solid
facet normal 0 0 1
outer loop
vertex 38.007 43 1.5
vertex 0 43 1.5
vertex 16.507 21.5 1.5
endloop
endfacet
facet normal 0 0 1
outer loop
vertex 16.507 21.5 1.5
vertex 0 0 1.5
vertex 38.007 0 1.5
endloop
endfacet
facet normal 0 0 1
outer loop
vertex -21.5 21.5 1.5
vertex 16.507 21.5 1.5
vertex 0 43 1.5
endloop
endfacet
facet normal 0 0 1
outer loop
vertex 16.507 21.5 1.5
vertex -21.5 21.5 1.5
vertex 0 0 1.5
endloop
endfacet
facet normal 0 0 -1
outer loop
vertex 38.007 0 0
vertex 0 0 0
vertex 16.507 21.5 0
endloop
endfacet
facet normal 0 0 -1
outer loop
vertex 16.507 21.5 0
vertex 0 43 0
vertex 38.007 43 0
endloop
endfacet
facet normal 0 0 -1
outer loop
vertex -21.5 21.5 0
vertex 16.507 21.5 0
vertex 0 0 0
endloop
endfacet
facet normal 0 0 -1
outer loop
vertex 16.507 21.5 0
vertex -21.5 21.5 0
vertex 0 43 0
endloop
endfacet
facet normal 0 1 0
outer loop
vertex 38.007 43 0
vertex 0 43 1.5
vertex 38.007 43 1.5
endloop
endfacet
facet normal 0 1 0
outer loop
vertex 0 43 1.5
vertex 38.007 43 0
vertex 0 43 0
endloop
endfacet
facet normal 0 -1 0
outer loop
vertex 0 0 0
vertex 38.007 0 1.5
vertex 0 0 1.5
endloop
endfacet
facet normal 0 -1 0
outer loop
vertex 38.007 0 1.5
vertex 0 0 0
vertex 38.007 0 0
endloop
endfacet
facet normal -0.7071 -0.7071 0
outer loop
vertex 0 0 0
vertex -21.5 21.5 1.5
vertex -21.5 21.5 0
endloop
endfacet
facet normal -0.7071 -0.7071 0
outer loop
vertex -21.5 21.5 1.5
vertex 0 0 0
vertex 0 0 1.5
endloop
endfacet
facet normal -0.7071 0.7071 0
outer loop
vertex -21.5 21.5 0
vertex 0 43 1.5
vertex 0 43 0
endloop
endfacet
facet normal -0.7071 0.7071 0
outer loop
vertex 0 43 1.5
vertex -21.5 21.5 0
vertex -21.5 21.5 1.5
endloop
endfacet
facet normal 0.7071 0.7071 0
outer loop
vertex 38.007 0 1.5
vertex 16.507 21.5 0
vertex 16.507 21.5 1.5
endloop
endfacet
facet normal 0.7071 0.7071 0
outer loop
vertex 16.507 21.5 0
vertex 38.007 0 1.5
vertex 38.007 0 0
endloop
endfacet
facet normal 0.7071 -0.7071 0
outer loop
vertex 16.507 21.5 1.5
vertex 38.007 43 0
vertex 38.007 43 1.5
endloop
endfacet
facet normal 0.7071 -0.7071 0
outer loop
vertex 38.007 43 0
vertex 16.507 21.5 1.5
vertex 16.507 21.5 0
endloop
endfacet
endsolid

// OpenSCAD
$tileH = 43;
$m = $tileH / 10;
$c = sqrt(pow($tileH, 2)/2);
$d = 1.5;
$fn = 3;
$links = 4;

difference() {
union() {
translate([0, 0, 0]) {
    cube([$tileH*$links/4, $tileH, $d]);
}

for (i = [0:$links]) {
     translate([i * $c/4, 0, 0]) {
        rotate([0, 0, 45]) {
            if (i==0) {
                cube([$c, $c, 1.5]);
            } else {
             //  cube([$c, $c, $d*(i+1)]);
            }
        }
        if (i < $links-1) {
            translate([-$tileH/4, $tileH/2-$m/2, $d*i]) {
       //  rotate([0, 50, 0]) {
        //    cube([$m, $m, $m *2]);
        //}
      }
  }
     }
}

}



translate([($links+1) * $c/4, 0, -2]) {
        rotate([0, 0, 45]) {
            cube([$c, $c, $d * ($links+1)*2]);
        }
     }
translate([($links+1) * $c/4, -$c, -2]) {
            cube([$c*3, $c*3, $d * 25]);
     }
translate([-$tileH, 0, -$d*3]) {
    cube([$tileH*$links/2, $tileH, $d*3]);
}
}
